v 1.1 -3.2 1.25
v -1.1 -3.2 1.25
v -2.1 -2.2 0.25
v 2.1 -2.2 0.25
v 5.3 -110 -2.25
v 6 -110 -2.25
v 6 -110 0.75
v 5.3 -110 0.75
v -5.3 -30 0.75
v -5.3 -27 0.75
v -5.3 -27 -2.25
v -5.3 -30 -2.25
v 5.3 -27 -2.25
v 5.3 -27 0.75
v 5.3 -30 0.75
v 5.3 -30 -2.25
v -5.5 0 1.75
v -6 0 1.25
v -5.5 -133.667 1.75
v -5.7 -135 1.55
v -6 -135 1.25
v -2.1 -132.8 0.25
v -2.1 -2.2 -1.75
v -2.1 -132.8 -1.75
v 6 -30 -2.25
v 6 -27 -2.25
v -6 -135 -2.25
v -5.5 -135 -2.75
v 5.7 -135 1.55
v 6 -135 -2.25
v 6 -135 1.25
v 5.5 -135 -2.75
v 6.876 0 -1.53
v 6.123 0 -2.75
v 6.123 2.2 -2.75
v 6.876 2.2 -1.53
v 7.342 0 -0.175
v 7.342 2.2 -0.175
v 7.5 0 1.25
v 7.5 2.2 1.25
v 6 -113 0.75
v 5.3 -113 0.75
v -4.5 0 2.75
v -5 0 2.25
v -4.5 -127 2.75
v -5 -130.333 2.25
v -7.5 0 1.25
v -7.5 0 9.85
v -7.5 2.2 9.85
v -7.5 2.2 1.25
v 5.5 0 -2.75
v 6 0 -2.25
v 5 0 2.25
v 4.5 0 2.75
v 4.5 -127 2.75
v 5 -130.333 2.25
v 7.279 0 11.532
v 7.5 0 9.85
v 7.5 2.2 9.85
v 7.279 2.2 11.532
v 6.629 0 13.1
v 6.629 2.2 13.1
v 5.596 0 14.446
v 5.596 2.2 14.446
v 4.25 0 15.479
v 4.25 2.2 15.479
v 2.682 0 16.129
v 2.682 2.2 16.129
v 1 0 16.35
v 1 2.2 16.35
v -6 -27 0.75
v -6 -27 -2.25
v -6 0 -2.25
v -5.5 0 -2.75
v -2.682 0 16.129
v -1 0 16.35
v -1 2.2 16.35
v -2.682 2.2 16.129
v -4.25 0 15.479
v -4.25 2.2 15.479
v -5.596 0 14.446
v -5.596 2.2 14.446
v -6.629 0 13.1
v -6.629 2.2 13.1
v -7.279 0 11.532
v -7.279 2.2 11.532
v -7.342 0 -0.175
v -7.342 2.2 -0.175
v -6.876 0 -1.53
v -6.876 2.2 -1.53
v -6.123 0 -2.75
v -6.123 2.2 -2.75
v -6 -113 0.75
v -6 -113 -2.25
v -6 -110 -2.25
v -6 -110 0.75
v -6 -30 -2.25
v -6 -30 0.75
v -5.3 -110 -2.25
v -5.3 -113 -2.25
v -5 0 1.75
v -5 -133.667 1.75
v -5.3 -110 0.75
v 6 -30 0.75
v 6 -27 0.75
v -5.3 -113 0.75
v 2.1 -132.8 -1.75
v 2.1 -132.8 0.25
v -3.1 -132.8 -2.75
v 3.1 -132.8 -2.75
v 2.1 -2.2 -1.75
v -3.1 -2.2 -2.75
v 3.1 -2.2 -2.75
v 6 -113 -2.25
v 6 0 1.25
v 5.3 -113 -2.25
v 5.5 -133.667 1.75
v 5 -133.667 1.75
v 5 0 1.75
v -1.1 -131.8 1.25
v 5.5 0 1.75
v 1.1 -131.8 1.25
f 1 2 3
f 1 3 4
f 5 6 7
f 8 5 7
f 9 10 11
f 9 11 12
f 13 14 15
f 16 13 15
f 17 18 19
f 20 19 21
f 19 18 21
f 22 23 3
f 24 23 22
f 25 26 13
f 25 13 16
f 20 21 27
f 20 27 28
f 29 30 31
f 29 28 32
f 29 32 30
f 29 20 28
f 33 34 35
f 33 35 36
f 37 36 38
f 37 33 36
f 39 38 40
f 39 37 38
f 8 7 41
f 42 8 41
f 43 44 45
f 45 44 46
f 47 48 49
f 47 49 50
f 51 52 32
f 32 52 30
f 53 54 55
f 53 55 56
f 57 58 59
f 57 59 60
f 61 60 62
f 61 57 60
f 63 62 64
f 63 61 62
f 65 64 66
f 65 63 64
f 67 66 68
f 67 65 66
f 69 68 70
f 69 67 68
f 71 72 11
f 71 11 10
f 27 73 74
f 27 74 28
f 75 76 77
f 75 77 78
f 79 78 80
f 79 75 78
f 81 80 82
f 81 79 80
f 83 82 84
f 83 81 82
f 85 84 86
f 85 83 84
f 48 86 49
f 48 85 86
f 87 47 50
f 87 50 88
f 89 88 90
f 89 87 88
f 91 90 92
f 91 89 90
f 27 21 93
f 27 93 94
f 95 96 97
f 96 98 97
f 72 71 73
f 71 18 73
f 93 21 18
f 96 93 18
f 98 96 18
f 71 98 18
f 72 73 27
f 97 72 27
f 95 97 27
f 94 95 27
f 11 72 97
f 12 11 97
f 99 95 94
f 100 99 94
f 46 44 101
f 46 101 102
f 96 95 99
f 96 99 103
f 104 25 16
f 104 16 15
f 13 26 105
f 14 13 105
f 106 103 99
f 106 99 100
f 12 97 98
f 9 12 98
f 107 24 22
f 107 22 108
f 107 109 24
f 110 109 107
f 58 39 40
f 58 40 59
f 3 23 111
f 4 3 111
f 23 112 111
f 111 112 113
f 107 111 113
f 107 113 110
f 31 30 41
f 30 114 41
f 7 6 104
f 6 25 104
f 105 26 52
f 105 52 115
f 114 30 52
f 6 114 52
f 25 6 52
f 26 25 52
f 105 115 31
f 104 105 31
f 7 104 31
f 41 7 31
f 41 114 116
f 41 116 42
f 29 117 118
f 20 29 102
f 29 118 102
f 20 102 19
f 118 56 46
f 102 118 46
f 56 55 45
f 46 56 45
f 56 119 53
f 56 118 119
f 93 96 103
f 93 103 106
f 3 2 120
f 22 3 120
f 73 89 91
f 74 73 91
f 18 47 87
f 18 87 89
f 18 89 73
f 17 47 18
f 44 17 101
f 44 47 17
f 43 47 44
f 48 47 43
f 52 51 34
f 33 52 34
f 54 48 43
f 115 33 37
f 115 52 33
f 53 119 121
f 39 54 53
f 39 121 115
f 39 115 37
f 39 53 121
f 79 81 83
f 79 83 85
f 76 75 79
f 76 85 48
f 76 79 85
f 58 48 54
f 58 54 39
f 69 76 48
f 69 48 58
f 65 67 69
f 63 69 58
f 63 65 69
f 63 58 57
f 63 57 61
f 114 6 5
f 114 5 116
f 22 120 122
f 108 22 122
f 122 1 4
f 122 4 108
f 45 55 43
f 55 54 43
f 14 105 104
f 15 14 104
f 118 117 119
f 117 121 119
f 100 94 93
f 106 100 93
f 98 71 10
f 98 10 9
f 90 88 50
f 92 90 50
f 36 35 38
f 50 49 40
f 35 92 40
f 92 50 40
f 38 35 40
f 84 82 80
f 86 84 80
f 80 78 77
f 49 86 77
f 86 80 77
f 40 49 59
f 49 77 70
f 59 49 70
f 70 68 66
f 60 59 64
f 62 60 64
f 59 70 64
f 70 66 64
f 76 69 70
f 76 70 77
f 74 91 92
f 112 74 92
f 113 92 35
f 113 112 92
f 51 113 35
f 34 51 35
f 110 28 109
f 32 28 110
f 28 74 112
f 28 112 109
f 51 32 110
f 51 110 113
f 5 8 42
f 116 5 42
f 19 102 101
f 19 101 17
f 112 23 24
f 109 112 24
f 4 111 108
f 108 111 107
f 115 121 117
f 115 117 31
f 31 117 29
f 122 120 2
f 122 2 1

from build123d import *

# Parameters (mm, degrees)
F1_DEPTH = 135
F2_SIZE2 = 8
F2_SIZE  = 1.2
F4_DEPTH = 2.2
F5_W     = 3
F5_H     = 3
F6_DEPTH = 0.7
F7_SIZE  = 0.49999
F8_W     = 4.2
F8_H     = 130.6
F9_DEPTH = 4
F10_SIZE = 1


# Not quite as in the source:
# - a fillet or chamfer is up to 0.001 mm smaller than in the source, because OpenCascade refuses the exact size
# - a pattern or mirror of a feature is missing from the dataset's text; its kind, count and spacing are read off the source's solid


with BuildPart() as f1:
    # F0 (on Front) → F1 (new body)
    with BuildSketch(Plane.XZ):
        Polygon((-6, -2.75), (6, -2.75), (6, 1.75), (5, 1.75), (5, 2.75), (-5, 2.75), (-5, 1.75), (-6, 1.75), align=None)
    extrude(amount=F1_DEPTH)

    # F2
    f2_edges = [f1.edges().sort_by_distance(p)[0] for p in [
        (0, -135, 2.75),
    ]]
    f2_side = f1.faces().sort_by_distance((0, -135, -0.070312))[0]
    chamfer(f2_edges, length=F2_SIZE, length2=F2_SIZE2, reference=f2_side)

    # F3 (on Front) → F4 (join)
    with BuildSketch(Plane.XZ):
        with BuildLine():
            ThreePointArc((7.5, 9.85), (5.5961940777, 14.4461940777), (1, 16.35))
            Line((1, 16.35), (-1, 16.35))
            ThreePointArc((-1, 16.35), (-5.5961940777, 14.4461940777), (-7.5, 9.85))
            Line((-7.5, 9.85), (-7.5, 1.25))
            ThreePointArc((-7.5, 1.25), (-7.1462423475, -0.8651134734), (-6.123475383, -2.75))
            Line((-6.123475383, -2.75), (6.123475383, -2.75))
            ThreePointArc((6.123475383, -2.75), (7.1462423475, -0.8651134734), (7.5, 1.25))
            Line((7.5, 1.25), (7.5, 9.85))
        make_face()
    extrude(amount=-F4_DEPTH)

    # F5 (on face) → F6 (cut)
    with BuildSketch(Plane(origin=(-6, 0, 0), x_dir=(0, -1, 0), z_dir=(-1, 0, 0))):
        with Locations((28.5, -0.75)):
            Rectangle(F5_W, F5_H)
        with Locations((111.5, -0.75)):
            Rectangle(F5_W, F5_H)
    f6 = extrude(amount=-F6_DEPTH, mode=Mode.SUBTRACT)

    # F6_copies: F6 across plane
    add(f6.mirror(Plane(origin=(0, 0, 0), x_dir=(0, 0, 1), z_dir=(1, 0, 0))), mode=Mode.SUBTRACT)

    # F7 (size 0.5 in the source; OpenCascade refuses exactly that, so slightly less here)
    f7_edges = [f1.edges().sort_by_distance(p)[0] for p in [
        (6, -67.5, -2.75),
        (-6, -67.5, -2.75),
        (6, -66.833333, 1.75),
        (5, -63.5, 2.75),
        (-5, -63.5, 2.75),
        (-6, -66.833333, 1.75),
    ]]
    chamfer(f7_edges, length=F7_SIZE)

    # F8 (on face) → F9 (cut)
    with BuildSketch(Plane(origin=(0, 0, -2.75), x_dir=(1, 0, 0), z_dir=(0, 0, -1))):
        with Locations((0, 67.5)):
            Rectangle(F8_W, F8_H)
    extrude(amount=-F9_DEPTH, mode=Mode.SUBTRACT)

    # F10
    f10_edges = [f1.edges().sort_by_distance(p)[0] for p in [
        (0, -132.8, 1.25),
        (-2.1, -67.5, 1.25),
        (2.1, -67.5, 1.25),
        (0, -2.2, 1.25),
        (2.1, -67.5, -2.75),
        (-2.1, -67.5, -2.75),
    ]]
    chamfer(f10_edges, length=F10_SIZE)


solid = f1.part
